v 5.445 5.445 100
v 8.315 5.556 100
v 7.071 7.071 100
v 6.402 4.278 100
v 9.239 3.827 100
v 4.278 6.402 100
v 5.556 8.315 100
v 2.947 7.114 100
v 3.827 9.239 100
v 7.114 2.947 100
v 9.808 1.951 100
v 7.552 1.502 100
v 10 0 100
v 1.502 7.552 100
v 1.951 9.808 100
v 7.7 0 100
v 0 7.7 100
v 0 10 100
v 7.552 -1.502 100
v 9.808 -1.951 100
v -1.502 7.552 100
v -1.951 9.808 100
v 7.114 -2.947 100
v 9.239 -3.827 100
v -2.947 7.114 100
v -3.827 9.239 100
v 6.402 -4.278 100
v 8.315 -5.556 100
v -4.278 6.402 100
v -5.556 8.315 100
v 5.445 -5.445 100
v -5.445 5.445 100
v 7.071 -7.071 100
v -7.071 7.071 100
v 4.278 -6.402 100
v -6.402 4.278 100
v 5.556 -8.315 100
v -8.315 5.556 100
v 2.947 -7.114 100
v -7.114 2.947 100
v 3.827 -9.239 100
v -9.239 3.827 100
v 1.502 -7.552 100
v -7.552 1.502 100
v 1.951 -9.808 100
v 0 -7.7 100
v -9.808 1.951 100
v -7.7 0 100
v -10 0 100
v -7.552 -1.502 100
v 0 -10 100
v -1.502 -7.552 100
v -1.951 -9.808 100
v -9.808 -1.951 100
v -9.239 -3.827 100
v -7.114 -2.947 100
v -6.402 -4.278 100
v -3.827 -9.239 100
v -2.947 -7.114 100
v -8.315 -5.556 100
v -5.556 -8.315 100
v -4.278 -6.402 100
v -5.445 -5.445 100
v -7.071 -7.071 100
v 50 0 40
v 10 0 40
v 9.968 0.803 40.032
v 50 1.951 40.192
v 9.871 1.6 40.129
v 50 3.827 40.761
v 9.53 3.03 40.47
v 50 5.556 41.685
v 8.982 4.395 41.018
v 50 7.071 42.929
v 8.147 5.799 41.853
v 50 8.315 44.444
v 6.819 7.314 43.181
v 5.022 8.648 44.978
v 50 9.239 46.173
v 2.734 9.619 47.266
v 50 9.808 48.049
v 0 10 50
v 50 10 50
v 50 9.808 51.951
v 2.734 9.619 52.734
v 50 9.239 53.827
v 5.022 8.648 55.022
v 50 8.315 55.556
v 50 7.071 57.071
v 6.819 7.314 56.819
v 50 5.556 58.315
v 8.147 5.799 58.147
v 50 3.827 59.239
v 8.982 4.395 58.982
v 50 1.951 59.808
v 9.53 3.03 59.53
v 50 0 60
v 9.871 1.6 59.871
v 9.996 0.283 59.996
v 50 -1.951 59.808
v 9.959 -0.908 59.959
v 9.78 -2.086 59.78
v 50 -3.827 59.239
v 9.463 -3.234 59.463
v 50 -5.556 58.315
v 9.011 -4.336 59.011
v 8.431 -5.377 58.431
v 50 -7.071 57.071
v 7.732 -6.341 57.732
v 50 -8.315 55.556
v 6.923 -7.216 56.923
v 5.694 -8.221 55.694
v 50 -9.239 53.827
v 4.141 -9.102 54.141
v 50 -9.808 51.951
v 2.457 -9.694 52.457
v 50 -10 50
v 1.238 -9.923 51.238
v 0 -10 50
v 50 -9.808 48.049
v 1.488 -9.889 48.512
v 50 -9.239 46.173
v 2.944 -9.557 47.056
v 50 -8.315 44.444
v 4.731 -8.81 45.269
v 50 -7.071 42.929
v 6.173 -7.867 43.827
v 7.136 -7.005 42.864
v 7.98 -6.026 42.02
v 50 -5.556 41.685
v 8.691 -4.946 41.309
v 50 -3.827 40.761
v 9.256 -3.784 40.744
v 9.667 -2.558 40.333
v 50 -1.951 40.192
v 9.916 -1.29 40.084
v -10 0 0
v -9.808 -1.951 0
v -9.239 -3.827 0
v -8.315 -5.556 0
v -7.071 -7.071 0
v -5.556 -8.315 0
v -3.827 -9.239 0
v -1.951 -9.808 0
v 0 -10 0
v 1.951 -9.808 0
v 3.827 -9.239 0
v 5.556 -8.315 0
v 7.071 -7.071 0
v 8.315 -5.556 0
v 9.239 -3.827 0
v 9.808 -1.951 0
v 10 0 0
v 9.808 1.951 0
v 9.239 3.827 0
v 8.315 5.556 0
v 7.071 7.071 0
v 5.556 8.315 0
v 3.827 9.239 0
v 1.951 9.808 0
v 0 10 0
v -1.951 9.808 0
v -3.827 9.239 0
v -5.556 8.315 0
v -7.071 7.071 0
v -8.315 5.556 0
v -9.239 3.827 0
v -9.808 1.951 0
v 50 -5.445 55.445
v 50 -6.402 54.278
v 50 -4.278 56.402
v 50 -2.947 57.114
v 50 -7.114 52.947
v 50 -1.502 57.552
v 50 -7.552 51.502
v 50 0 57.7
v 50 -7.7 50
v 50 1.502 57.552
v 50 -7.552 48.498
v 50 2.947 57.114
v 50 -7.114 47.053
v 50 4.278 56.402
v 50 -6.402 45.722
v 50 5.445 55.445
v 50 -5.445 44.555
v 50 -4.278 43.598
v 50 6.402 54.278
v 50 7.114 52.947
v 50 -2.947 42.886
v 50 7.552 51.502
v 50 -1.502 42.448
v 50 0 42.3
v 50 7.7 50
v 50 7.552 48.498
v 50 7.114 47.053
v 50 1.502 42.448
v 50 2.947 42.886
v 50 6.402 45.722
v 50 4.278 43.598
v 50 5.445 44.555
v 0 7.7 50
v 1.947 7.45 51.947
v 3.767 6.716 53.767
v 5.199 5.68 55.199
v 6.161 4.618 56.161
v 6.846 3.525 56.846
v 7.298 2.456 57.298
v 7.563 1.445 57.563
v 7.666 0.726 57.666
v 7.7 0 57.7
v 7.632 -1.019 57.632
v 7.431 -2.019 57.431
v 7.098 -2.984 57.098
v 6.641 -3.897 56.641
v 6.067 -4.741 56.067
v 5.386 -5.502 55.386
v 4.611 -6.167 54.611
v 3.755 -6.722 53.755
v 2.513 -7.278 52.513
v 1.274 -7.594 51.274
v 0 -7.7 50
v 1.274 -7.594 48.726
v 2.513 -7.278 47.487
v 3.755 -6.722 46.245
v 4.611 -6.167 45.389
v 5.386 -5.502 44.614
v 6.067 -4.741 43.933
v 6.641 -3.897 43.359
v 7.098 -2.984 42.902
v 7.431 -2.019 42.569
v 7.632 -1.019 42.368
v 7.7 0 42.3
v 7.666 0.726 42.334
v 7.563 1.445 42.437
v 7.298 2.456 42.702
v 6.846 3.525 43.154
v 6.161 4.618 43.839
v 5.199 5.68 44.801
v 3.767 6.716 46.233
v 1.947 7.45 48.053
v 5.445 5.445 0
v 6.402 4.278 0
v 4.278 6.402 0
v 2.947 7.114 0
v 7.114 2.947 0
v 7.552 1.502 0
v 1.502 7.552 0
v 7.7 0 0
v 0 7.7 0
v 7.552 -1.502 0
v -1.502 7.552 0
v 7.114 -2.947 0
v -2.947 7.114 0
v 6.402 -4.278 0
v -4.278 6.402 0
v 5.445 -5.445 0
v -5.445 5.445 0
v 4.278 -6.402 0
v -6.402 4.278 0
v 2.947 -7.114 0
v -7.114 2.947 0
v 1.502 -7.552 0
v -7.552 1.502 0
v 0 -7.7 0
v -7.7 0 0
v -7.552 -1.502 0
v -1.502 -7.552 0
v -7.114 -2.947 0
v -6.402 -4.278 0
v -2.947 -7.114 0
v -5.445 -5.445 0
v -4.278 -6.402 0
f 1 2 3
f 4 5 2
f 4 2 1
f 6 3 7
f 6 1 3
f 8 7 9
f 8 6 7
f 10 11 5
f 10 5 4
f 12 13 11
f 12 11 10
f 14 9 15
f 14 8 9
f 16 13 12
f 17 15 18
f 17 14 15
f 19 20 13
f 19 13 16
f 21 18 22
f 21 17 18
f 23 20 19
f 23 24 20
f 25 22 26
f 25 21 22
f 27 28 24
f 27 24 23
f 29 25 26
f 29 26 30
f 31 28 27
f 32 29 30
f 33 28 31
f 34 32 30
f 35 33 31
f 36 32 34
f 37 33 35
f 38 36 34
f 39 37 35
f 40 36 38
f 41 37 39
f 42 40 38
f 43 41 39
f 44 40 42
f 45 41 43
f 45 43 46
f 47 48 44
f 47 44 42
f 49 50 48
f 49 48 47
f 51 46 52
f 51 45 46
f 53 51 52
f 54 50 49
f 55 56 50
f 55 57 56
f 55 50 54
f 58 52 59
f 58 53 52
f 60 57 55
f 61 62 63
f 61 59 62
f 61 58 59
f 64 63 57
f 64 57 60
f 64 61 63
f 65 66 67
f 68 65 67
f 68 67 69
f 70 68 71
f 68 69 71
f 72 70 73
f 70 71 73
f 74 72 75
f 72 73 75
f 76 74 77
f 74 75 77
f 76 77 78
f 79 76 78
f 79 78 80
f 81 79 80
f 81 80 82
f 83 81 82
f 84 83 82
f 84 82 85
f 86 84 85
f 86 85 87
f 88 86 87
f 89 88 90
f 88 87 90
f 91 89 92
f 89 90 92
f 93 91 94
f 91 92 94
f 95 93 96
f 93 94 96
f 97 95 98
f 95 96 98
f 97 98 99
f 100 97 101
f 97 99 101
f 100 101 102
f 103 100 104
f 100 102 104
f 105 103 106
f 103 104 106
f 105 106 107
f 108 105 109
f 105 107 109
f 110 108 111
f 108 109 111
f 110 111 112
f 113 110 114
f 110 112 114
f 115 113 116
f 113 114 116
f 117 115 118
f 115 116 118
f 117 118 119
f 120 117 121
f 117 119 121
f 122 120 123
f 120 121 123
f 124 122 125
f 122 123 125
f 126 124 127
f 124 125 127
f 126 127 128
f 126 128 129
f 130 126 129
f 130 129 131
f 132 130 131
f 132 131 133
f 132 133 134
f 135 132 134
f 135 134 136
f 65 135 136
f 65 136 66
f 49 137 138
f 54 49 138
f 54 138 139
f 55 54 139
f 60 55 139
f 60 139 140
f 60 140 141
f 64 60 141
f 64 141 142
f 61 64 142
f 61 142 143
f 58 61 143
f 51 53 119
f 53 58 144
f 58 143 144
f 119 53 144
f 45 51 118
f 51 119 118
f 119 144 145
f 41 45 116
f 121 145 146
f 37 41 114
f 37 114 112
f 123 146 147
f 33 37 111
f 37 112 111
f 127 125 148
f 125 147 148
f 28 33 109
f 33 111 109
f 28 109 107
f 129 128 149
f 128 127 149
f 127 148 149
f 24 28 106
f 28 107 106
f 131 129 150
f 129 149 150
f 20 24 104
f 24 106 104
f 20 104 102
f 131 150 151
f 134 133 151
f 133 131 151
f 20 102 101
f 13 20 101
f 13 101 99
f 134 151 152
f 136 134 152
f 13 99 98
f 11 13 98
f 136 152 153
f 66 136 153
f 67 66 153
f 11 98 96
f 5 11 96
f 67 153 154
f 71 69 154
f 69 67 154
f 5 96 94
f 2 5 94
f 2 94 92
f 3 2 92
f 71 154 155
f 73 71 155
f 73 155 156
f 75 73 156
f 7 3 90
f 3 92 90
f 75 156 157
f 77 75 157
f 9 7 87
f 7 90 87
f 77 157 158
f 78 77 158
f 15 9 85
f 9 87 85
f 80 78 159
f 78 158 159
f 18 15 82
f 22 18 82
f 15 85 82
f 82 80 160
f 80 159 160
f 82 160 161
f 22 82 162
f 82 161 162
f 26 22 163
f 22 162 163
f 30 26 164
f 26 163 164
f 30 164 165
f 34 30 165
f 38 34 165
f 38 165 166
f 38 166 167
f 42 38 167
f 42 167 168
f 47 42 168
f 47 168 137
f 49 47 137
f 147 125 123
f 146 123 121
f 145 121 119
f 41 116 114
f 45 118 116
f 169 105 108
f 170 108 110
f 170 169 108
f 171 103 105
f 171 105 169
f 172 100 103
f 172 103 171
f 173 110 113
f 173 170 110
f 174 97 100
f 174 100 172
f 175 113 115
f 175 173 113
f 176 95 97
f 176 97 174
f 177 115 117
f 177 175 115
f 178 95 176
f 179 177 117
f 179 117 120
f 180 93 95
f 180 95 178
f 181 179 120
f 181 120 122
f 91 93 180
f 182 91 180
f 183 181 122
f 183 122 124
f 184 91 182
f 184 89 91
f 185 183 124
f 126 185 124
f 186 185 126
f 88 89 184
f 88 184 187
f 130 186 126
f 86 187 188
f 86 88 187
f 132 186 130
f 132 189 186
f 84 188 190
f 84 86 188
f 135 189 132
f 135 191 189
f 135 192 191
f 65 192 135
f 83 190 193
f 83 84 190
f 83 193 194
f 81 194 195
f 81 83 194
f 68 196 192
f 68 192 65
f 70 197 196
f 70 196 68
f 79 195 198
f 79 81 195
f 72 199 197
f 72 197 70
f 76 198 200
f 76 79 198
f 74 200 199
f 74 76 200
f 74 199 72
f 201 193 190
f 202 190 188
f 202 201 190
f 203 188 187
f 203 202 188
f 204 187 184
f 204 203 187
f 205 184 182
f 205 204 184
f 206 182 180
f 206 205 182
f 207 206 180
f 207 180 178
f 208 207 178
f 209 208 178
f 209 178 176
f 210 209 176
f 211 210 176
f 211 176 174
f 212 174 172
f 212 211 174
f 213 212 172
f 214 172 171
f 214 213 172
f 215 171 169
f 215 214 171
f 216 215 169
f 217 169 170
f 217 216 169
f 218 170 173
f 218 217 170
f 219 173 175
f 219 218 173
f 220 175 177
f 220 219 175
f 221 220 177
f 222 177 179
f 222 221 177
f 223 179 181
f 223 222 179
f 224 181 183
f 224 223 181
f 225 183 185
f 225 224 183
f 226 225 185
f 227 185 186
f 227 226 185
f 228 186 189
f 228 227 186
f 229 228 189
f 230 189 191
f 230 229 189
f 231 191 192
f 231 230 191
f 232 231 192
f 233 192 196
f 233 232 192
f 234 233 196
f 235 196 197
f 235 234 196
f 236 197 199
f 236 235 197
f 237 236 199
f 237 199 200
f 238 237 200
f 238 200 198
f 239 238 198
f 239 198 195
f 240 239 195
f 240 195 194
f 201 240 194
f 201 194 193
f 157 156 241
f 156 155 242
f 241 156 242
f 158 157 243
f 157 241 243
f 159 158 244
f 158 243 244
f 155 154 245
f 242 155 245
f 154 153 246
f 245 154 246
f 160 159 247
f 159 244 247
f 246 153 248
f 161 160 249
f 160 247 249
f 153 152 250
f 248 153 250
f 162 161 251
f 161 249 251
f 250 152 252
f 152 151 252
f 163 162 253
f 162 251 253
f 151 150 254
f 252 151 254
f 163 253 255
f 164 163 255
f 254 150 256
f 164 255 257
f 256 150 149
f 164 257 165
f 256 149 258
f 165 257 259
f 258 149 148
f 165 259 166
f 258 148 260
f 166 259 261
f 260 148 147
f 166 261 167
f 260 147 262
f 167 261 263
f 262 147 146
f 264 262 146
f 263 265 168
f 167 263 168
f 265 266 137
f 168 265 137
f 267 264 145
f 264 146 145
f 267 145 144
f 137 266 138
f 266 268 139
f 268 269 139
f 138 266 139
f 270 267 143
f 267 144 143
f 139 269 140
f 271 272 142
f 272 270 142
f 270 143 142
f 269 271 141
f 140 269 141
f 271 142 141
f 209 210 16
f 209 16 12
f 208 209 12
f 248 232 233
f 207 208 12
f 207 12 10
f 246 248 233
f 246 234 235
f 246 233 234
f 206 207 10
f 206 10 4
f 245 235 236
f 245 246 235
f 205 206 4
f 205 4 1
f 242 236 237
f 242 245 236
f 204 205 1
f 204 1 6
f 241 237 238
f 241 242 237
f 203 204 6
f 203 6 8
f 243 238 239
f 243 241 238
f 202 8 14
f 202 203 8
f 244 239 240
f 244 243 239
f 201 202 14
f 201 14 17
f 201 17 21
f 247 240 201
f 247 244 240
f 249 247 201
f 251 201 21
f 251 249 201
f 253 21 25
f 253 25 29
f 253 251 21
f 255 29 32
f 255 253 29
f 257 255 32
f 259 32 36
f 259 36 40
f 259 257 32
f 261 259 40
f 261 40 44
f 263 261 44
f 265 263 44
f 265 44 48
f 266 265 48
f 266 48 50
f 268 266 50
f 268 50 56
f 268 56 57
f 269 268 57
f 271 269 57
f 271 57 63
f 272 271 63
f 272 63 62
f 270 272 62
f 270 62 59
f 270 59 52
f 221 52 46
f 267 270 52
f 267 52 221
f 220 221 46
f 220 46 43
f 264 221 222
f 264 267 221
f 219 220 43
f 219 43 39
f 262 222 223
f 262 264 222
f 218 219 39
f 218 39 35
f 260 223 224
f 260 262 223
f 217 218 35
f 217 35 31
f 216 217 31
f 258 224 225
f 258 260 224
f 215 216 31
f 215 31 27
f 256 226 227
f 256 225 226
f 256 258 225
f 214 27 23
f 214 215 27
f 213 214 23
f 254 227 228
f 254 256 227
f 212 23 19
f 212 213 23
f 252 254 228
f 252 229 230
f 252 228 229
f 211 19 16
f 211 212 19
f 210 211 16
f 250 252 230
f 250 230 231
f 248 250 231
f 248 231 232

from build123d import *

# Parameters (mm, degrees)
SKETCH12_R          = 10
BOSS_EXTRUDE2_DEPTH = 100
SKETCH13_R          = 10
BOSS_EXTRUDE3_DEPTH = 50
SHELL7_OUTLINE_R    = 7.7
SHELL7_DEPTH        = 100
SHELL7_START        = -1e-07
SHELL7_2_OUTLINE_R  = 7.7
SHELL7_2_DEPTH      = 50.0000001


with BuildPart() as part:
    # Sketch12 → Boss-Extrude2 (new body)
    with BuildSketch(Plane.XY):
        with Locations(Location((0, 0, 0), (0, 0, 180))):
            Circle(SKETCH12_R)
    extrude(amount=BOSS_EXTRUDE2_DEPTH)

    # Sketch13 → Boss-Extrude3 (add)
    with BuildSketch(Plane(origin=(0, 0, 0), x_dir=(0, 0, -1), z_dir=(1, 0, 0))):
        with Locations((-50, 0)):
            Circle(SKETCH13_R)
    extrude(amount=BOSS_EXTRUDE3_DEPTH)

    # Shell7: read off the stored shape, not the designer's step
    # Shell7 outline → Shell7 (cut)
    with BuildSketch(Plane.XY):
        Circle(SHELL7_OUTLINE_R)
    extrude(amount=SHELL7_DEPTH, mode=Mode.SUBTRACT)

    # Shell7 2 outline → Shell7 2 (cut)
    with BuildSketch(Plane.YZ.offset(SHELL7_START)):
        with Locations((0, 50)):
            Circle(SHELL7_2_OUTLINE_R)
    extrude(amount=SHELL7_2_DEPTH, mode=Mode.SUBTRACT)


solid = part.part
